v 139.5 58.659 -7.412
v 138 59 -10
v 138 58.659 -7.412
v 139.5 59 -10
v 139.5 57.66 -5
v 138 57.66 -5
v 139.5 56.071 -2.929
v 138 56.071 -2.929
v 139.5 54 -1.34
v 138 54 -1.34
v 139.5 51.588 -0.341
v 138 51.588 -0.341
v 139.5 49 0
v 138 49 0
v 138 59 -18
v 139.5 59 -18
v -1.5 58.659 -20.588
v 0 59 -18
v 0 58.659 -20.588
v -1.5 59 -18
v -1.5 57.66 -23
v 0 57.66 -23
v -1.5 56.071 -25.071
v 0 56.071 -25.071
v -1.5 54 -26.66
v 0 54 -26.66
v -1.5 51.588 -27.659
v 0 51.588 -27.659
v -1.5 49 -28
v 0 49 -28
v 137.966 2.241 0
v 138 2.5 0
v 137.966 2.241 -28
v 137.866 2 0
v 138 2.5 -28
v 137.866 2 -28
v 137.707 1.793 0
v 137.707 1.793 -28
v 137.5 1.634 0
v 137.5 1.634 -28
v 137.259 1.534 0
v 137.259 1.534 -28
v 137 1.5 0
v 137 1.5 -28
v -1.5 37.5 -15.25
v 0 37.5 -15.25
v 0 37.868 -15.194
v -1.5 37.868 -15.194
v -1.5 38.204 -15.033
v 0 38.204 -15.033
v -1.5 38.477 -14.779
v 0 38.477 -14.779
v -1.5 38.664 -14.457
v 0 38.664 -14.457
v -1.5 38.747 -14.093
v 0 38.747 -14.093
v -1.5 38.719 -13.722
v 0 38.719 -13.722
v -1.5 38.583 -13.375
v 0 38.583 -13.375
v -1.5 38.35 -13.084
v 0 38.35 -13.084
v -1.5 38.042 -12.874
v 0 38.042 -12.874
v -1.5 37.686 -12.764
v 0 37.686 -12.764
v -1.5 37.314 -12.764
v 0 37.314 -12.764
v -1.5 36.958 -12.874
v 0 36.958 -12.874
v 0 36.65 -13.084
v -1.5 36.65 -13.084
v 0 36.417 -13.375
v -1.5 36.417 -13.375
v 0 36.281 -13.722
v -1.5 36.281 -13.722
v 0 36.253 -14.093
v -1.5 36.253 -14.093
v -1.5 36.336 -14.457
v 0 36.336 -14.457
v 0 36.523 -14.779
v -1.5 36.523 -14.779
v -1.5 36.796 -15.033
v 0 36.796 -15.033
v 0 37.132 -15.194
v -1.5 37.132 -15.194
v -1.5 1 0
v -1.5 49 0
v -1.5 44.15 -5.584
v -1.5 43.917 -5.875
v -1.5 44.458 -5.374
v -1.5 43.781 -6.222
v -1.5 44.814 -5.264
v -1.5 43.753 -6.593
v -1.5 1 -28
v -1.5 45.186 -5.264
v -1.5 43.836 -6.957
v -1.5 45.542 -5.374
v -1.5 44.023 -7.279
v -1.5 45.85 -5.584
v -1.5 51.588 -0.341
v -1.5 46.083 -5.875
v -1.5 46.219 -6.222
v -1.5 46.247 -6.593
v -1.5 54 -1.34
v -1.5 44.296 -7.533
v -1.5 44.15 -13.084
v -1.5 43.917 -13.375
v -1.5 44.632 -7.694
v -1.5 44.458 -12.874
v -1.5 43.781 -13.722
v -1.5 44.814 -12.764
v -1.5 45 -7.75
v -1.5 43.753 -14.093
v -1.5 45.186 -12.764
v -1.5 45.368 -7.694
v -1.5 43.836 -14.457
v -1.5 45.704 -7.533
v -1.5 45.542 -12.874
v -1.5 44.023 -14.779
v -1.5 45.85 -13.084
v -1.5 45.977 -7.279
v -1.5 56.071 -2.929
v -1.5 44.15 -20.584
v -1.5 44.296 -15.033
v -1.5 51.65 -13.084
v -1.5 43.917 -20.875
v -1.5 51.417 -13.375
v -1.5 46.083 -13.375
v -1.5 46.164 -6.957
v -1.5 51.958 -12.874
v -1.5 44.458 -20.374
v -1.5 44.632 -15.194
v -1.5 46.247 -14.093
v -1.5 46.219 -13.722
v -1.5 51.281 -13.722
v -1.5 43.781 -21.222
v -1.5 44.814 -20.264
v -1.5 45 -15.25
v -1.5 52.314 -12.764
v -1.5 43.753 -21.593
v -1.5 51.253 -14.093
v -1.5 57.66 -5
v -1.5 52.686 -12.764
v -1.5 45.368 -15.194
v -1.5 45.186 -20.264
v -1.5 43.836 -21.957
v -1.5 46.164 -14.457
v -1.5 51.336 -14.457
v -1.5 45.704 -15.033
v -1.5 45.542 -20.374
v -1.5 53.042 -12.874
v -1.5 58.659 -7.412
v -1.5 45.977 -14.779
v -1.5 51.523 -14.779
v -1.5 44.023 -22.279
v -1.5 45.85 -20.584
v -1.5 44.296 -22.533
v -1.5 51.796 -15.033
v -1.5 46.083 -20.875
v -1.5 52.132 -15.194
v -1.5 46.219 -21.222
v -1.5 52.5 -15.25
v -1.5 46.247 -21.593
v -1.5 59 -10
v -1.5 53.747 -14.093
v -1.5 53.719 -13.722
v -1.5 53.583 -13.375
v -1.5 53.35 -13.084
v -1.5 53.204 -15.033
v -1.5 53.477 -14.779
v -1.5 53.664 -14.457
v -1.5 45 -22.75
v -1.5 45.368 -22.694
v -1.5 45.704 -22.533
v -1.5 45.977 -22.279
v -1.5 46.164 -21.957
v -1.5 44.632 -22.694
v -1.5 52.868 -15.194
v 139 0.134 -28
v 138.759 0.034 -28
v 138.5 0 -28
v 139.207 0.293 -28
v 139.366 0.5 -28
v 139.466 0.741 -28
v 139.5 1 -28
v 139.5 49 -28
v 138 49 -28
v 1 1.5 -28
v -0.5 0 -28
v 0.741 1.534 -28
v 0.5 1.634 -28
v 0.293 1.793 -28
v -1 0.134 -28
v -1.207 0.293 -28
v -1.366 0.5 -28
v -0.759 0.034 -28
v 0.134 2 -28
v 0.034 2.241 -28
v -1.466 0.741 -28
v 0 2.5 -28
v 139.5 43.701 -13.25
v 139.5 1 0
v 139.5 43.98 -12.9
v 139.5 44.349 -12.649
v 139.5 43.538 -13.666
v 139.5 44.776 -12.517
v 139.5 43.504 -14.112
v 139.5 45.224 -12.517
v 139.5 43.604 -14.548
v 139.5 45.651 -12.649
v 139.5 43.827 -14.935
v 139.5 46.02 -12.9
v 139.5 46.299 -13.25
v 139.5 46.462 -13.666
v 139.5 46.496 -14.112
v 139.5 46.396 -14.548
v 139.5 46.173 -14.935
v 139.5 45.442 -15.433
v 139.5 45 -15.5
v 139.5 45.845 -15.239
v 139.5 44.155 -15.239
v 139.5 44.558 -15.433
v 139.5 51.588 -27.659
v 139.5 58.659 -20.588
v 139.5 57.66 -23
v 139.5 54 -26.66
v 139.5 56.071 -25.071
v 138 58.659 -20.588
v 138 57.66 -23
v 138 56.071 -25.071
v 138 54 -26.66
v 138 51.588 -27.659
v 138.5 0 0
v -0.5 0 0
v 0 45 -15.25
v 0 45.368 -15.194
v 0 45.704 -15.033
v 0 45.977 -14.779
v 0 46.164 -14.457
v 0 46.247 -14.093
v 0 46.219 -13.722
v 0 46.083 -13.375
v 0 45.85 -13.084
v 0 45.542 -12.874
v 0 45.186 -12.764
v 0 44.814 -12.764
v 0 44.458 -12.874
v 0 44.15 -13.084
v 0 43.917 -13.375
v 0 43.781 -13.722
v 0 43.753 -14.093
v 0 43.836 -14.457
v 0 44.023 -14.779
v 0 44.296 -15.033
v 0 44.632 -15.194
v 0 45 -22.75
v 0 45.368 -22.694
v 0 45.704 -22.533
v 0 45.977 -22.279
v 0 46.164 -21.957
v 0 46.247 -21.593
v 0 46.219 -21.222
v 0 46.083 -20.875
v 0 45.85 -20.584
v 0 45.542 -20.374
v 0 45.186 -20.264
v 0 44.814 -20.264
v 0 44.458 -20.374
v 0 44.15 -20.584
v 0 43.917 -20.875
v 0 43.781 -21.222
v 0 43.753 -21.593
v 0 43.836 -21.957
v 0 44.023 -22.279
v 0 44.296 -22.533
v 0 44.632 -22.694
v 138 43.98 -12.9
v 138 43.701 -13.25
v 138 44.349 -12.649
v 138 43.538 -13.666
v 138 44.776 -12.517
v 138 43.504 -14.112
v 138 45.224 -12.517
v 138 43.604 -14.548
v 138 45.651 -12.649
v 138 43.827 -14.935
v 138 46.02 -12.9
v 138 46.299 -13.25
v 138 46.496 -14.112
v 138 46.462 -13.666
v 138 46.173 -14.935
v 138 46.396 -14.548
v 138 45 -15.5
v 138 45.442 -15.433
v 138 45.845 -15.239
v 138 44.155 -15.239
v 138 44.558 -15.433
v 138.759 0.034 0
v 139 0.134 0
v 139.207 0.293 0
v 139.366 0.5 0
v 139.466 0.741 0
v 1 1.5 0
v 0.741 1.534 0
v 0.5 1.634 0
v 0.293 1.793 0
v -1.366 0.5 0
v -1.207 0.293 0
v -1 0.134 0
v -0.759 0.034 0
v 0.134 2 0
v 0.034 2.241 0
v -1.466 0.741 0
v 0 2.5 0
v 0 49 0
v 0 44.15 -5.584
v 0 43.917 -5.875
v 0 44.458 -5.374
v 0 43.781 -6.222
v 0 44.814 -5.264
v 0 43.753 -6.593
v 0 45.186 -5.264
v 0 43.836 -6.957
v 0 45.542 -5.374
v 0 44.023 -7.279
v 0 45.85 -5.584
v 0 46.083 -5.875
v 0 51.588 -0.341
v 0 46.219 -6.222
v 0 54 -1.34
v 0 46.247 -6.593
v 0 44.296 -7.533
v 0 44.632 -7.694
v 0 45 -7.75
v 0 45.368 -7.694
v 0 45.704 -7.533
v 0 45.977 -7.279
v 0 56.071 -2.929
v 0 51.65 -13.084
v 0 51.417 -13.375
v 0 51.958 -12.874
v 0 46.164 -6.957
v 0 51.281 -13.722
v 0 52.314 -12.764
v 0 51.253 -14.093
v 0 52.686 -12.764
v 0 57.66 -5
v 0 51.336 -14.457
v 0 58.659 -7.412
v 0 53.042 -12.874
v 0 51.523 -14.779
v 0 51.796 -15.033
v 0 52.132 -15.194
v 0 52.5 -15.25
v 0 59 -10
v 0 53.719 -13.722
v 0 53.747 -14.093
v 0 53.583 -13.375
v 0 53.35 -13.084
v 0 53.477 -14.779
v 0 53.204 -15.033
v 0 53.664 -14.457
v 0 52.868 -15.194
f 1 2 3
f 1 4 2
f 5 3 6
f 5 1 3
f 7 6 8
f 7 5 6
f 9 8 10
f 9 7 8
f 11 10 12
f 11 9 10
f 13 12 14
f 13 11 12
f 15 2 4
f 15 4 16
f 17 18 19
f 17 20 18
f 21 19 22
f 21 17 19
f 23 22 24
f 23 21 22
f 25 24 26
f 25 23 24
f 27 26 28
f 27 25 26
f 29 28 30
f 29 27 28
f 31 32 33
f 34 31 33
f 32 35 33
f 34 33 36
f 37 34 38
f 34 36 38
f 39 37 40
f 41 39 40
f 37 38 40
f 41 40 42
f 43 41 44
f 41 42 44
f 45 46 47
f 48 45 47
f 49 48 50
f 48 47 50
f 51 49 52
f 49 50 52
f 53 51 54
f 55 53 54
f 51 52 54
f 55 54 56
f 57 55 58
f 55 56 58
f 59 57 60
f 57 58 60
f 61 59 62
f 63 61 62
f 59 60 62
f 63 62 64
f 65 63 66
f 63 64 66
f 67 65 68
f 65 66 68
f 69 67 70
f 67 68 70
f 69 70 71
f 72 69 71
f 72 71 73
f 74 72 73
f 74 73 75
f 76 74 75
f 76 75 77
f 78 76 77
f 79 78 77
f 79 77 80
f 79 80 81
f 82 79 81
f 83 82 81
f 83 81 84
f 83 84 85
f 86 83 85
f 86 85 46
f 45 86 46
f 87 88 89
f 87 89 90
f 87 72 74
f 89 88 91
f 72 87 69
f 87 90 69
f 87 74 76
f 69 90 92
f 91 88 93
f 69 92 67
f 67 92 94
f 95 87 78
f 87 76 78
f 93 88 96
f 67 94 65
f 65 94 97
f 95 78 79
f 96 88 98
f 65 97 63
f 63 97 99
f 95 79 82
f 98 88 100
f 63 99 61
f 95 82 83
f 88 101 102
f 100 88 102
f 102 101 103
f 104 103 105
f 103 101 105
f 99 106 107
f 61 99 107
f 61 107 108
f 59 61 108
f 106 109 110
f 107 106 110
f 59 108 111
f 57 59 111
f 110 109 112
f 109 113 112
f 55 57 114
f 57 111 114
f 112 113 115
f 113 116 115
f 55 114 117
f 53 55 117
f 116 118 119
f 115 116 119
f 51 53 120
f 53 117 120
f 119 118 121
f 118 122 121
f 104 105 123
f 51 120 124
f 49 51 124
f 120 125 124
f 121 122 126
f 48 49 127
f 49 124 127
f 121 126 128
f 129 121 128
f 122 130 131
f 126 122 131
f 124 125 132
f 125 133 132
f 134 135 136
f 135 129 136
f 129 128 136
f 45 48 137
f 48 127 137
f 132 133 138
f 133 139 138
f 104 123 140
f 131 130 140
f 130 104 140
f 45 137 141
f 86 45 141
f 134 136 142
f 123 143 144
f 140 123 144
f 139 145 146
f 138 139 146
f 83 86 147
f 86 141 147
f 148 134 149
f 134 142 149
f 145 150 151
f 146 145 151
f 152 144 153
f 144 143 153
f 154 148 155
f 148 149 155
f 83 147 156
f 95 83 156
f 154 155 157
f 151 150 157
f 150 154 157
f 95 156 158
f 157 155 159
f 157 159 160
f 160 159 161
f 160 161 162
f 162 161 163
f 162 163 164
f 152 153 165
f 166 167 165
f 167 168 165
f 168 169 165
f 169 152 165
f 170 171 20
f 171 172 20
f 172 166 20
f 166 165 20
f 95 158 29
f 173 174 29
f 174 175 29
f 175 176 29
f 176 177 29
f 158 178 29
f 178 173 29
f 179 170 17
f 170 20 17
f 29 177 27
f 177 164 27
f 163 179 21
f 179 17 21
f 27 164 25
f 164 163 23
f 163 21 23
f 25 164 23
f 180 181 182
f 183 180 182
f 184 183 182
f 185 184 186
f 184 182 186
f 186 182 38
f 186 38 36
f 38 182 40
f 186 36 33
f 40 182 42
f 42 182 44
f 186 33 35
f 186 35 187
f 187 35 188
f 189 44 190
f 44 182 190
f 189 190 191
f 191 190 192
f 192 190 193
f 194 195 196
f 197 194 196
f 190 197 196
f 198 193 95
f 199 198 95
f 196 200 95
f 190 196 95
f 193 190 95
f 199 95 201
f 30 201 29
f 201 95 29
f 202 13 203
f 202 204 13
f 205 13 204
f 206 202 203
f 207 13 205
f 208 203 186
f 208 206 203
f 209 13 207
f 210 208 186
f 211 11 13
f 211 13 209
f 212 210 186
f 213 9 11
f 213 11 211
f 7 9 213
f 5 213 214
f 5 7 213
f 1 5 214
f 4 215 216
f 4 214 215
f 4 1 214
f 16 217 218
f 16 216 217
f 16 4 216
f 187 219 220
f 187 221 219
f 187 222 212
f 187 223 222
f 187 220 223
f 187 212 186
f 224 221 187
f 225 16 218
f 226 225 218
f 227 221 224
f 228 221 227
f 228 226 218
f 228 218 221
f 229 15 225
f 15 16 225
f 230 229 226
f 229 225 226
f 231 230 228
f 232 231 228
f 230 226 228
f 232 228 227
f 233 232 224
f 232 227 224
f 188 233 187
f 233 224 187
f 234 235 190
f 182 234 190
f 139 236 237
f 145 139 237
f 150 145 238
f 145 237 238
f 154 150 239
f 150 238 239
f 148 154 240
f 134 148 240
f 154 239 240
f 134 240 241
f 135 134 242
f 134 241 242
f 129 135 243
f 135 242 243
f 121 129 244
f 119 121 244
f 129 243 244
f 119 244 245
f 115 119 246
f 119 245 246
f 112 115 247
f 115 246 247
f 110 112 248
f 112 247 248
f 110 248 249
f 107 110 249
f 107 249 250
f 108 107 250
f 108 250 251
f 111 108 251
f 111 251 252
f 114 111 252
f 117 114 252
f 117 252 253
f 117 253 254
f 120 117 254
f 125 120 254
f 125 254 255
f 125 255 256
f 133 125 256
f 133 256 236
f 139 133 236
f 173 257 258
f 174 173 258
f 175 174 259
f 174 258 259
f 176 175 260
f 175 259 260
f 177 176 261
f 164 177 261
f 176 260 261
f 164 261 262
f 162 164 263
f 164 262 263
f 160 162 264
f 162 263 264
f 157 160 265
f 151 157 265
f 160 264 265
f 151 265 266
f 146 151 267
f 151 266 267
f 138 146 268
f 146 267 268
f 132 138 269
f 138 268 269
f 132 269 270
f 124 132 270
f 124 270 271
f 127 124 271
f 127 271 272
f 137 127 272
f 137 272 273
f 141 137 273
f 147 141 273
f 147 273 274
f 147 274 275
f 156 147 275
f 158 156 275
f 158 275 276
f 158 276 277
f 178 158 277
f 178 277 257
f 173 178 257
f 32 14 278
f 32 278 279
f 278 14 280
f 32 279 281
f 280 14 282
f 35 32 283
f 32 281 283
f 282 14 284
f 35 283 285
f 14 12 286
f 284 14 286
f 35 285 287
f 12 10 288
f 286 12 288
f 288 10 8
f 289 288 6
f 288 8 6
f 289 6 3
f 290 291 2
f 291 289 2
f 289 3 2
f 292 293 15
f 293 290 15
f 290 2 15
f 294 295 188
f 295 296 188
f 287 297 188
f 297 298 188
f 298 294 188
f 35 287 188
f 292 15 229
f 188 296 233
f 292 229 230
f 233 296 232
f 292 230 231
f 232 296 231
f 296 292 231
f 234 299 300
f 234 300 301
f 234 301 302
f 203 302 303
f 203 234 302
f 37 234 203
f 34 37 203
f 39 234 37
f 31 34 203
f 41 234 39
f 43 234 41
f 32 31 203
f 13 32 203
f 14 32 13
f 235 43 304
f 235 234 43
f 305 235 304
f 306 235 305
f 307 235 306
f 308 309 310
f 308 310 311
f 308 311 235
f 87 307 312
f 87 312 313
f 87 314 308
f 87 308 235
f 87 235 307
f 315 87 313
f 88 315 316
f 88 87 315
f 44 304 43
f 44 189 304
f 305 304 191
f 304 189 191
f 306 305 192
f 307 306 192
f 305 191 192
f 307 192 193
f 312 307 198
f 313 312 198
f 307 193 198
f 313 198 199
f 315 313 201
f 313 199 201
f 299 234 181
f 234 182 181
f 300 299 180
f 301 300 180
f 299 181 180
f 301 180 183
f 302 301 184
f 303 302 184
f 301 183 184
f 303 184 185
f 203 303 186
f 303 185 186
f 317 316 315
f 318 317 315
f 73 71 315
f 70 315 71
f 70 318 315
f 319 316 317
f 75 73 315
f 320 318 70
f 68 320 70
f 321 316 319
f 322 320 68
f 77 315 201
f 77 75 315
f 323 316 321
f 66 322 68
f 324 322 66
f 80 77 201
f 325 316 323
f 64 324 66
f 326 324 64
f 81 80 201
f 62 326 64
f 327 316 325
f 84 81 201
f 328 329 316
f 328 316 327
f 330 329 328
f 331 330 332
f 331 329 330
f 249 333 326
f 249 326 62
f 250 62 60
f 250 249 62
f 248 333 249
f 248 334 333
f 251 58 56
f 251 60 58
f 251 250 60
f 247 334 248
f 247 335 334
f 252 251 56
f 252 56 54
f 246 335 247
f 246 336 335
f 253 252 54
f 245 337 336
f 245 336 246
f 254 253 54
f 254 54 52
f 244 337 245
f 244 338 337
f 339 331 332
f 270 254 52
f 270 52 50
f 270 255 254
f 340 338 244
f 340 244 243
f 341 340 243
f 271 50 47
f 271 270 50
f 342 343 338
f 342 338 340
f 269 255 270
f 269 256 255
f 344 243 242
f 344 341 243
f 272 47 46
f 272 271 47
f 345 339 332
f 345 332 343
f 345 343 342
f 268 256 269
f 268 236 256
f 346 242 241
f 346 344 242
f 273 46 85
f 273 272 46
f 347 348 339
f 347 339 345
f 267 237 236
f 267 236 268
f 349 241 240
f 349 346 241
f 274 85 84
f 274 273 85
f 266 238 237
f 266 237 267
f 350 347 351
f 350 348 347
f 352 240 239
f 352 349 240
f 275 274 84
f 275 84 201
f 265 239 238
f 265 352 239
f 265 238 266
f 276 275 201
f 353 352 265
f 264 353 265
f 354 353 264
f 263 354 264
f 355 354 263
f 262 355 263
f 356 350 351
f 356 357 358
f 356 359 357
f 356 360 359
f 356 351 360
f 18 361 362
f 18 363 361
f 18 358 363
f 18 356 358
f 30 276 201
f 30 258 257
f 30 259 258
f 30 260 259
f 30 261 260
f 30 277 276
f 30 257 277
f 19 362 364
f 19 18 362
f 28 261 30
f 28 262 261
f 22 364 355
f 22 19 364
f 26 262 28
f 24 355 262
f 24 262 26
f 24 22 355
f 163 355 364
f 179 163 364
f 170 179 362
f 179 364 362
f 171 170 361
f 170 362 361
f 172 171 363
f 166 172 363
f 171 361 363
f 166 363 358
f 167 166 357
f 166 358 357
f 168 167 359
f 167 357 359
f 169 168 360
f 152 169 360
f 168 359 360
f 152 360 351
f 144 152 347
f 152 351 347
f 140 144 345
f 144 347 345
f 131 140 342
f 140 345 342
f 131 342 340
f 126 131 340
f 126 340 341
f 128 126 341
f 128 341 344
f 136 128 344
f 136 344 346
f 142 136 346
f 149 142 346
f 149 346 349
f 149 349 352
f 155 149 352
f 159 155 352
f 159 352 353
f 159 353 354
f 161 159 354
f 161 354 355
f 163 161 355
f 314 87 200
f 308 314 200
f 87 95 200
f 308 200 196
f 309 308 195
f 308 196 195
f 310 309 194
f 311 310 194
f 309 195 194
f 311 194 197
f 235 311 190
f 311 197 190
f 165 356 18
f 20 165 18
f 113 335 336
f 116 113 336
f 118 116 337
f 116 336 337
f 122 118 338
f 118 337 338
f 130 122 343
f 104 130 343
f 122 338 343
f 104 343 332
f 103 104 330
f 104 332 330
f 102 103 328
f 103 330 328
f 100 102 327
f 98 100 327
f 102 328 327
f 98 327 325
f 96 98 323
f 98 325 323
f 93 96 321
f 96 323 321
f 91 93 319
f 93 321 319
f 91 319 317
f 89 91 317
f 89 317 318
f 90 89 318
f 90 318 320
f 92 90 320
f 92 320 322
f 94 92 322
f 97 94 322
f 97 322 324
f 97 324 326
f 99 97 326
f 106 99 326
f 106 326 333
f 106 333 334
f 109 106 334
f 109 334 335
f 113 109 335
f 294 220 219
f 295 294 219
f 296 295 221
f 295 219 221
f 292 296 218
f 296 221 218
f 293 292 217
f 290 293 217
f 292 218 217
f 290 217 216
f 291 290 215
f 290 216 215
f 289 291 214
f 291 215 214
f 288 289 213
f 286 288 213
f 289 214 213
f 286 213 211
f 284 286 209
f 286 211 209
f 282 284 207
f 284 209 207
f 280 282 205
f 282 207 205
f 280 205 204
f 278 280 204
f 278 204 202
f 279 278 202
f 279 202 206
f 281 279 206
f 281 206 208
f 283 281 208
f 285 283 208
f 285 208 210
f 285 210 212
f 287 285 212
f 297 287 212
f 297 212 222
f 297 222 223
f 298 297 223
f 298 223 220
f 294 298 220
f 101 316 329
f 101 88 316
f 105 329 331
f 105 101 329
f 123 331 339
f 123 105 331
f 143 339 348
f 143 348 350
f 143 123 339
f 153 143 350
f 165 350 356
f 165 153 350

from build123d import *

# Parameters (mm, degrees)
SKETCH1_W               = 138
SKETCH1_H               = 28
BOSS_EXTRUDE1_DEPTH     = 1.5
SKETCH2_W               = 28
SKETCH2_H               = 59
BOSS_EXTRUDE2_DEPTH     = 1.5
FILLET1_R               = 1
FILLET2_R               = 1
FILLET5_R               = 10
SKETCH3_R               = 1.25
CUT_EXTRUDE1_DEPTH      = 15
CUT_EXTRUDE1_DEPTH_BACK = 15
SKETCH4_W               = 28
SKETCH4_H               = 59
BOSS_EXTRUDE3_DEPTH     = 1.5
FILLET6_R               = 1
FILLET7_R               = 1
SKETCH5_R               = 1.5
CUT_EXTRUDE3_DEPTH      = 1.5
CUT_EXTRUDE3_DEPTH_BACK = 31.5
FILLET10_R              = 10
FILLET11_R              = 10


with BuildPart() as part:
    # Sketch1 → Boss-Extrude1 (new body)
    with BuildSketch(Plane(origin=(0, 0, 0), x_dir=(1, 0, 0), z_dir=(0, 1, 0))):
        with Locations((69, 14)):
            Rectangle(SKETCH1_W, SKETCH1_H)
    extrude(amount=BOSS_EXTRUDE1_DEPTH)

    # Sketch2 → Boss-Extrude2 (add)
    with BuildSketch(Plane(origin=(0, 0, 0), x_dir=(0, 0, -1), z_dir=(1, 0, 0))):
        with Locations((14, 29.5)):
            Rectangle(SKETCH2_W, SKETCH2_H)
    extrude(amount=-BOSS_EXTRUDE2_DEPTH)

    # Fillet1
    fillet1_edges = [part.edges().sort_by_distance(p)[0] for p in [
        (0, 1.5, -14),
    ]]
    fillet(fillet1_edges, radius=FILLET1_R)

    # Fillet2
    fillet2_edges = [part.edges().sort_by_distance(p)[0] for p in [
        (-1.5, 0, -14),
    ]]
    fillet(fillet2_edges, radius=FILLET2_R)

    # Fillet5
    fillet5_edges = [part.edges().sort_by_distance(p)[0] for p in [
        (-0.75, 59, 0),
        (-0.75, 59, -28),
    ]]
    fillet(fillet5_edges, radius=FILLET5_R)

    # Sketch3 → Cut-Extrude1 (cut, two sides)
    with BuildSketch(Plane(origin=(0, 0, 0), x_dir=(0, 0, -1), z_dir=(1, 0, 0))) as cut_extrude1_sk:
        with Locations((14, 52.5)):
            Circle(SKETCH3_R)
        with Locations((6.5, 45)):
            Circle(SKETCH3_R)
        with Locations((14, 45)):
            Circle(SKETCH3_R)
        with Locations((21.5, 45)):
            Circle(SKETCH3_R)
        with Locations((14, 37.5)):
            Circle(SKETCH3_R)
    extrude(amount=CUT_EXTRUDE1_DEPTH, mode=Mode.SUBTRACT)
    extrude(cut_extrude1_sk.sketch, amount=-CUT_EXTRUDE1_DEPTH_BACK, mode=Mode.SUBTRACT)

    # Sketch4 → Boss-Extrude3 (add)
    with BuildSketch(Plane(origin=(138, 0, 0), x_dir=(0, 0, -1), z_dir=(1, 0, 0))):
        with Locations((14, 29.5)):
            Rectangle(SKETCH4_W, SKETCH4_H)
    extrude(amount=BOSS_EXTRUDE3_DEPTH)

    # Fillet6
    fillet6_edges = [part.edges().sort_by_distance(p)[0] for p in [
        (139.5, 0, -14),
    ]]
    fillet(fillet6_edges, radius=FILLET6_R)

    # Fillet7
    fillet7_edges = [part.edges().sort_by_distance(p)[0] for p in [
        (138, 1.5, -14),
    ]]
    fillet(fillet7_edges, radius=FILLET7_R)

    # Sketch5 → Cut-Extrude3 (cut, two sides)
    with BuildSketch(Plane(origin=(139.5, 0, 0), x_dir=(0, 0, -1), z_dir=(1, 0, 0))) as cut_extrude3_sk:
        with Locations((14, 45)):
            Circle(SKETCH5_R)
    extrude(amount=CUT_EXTRUDE3_DEPTH, mode=Mode.SUBTRACT)
    extrude(cut_extrude3_sk.sketch, amount=-CUT_EXTRUDE3_DEPTH_BACK, mode=Mode.SUBTRACT)

    # Fillet10
    fillet10_edges = [part.edges().sort_by_distance(p)[0] for p in [
        (138.75, 59, -28),
    ]]
    fillet(fillet10_edges, radius=FILLET10_R)

    # Fillet11
    fillet11_edges = [part.edges().sort_by_distance(p)[0] for p in [
        (138.75, 59, 0),
    ]]
    fillet(fillet11_edges, radius=FILLET11_R)


solid = part.part
